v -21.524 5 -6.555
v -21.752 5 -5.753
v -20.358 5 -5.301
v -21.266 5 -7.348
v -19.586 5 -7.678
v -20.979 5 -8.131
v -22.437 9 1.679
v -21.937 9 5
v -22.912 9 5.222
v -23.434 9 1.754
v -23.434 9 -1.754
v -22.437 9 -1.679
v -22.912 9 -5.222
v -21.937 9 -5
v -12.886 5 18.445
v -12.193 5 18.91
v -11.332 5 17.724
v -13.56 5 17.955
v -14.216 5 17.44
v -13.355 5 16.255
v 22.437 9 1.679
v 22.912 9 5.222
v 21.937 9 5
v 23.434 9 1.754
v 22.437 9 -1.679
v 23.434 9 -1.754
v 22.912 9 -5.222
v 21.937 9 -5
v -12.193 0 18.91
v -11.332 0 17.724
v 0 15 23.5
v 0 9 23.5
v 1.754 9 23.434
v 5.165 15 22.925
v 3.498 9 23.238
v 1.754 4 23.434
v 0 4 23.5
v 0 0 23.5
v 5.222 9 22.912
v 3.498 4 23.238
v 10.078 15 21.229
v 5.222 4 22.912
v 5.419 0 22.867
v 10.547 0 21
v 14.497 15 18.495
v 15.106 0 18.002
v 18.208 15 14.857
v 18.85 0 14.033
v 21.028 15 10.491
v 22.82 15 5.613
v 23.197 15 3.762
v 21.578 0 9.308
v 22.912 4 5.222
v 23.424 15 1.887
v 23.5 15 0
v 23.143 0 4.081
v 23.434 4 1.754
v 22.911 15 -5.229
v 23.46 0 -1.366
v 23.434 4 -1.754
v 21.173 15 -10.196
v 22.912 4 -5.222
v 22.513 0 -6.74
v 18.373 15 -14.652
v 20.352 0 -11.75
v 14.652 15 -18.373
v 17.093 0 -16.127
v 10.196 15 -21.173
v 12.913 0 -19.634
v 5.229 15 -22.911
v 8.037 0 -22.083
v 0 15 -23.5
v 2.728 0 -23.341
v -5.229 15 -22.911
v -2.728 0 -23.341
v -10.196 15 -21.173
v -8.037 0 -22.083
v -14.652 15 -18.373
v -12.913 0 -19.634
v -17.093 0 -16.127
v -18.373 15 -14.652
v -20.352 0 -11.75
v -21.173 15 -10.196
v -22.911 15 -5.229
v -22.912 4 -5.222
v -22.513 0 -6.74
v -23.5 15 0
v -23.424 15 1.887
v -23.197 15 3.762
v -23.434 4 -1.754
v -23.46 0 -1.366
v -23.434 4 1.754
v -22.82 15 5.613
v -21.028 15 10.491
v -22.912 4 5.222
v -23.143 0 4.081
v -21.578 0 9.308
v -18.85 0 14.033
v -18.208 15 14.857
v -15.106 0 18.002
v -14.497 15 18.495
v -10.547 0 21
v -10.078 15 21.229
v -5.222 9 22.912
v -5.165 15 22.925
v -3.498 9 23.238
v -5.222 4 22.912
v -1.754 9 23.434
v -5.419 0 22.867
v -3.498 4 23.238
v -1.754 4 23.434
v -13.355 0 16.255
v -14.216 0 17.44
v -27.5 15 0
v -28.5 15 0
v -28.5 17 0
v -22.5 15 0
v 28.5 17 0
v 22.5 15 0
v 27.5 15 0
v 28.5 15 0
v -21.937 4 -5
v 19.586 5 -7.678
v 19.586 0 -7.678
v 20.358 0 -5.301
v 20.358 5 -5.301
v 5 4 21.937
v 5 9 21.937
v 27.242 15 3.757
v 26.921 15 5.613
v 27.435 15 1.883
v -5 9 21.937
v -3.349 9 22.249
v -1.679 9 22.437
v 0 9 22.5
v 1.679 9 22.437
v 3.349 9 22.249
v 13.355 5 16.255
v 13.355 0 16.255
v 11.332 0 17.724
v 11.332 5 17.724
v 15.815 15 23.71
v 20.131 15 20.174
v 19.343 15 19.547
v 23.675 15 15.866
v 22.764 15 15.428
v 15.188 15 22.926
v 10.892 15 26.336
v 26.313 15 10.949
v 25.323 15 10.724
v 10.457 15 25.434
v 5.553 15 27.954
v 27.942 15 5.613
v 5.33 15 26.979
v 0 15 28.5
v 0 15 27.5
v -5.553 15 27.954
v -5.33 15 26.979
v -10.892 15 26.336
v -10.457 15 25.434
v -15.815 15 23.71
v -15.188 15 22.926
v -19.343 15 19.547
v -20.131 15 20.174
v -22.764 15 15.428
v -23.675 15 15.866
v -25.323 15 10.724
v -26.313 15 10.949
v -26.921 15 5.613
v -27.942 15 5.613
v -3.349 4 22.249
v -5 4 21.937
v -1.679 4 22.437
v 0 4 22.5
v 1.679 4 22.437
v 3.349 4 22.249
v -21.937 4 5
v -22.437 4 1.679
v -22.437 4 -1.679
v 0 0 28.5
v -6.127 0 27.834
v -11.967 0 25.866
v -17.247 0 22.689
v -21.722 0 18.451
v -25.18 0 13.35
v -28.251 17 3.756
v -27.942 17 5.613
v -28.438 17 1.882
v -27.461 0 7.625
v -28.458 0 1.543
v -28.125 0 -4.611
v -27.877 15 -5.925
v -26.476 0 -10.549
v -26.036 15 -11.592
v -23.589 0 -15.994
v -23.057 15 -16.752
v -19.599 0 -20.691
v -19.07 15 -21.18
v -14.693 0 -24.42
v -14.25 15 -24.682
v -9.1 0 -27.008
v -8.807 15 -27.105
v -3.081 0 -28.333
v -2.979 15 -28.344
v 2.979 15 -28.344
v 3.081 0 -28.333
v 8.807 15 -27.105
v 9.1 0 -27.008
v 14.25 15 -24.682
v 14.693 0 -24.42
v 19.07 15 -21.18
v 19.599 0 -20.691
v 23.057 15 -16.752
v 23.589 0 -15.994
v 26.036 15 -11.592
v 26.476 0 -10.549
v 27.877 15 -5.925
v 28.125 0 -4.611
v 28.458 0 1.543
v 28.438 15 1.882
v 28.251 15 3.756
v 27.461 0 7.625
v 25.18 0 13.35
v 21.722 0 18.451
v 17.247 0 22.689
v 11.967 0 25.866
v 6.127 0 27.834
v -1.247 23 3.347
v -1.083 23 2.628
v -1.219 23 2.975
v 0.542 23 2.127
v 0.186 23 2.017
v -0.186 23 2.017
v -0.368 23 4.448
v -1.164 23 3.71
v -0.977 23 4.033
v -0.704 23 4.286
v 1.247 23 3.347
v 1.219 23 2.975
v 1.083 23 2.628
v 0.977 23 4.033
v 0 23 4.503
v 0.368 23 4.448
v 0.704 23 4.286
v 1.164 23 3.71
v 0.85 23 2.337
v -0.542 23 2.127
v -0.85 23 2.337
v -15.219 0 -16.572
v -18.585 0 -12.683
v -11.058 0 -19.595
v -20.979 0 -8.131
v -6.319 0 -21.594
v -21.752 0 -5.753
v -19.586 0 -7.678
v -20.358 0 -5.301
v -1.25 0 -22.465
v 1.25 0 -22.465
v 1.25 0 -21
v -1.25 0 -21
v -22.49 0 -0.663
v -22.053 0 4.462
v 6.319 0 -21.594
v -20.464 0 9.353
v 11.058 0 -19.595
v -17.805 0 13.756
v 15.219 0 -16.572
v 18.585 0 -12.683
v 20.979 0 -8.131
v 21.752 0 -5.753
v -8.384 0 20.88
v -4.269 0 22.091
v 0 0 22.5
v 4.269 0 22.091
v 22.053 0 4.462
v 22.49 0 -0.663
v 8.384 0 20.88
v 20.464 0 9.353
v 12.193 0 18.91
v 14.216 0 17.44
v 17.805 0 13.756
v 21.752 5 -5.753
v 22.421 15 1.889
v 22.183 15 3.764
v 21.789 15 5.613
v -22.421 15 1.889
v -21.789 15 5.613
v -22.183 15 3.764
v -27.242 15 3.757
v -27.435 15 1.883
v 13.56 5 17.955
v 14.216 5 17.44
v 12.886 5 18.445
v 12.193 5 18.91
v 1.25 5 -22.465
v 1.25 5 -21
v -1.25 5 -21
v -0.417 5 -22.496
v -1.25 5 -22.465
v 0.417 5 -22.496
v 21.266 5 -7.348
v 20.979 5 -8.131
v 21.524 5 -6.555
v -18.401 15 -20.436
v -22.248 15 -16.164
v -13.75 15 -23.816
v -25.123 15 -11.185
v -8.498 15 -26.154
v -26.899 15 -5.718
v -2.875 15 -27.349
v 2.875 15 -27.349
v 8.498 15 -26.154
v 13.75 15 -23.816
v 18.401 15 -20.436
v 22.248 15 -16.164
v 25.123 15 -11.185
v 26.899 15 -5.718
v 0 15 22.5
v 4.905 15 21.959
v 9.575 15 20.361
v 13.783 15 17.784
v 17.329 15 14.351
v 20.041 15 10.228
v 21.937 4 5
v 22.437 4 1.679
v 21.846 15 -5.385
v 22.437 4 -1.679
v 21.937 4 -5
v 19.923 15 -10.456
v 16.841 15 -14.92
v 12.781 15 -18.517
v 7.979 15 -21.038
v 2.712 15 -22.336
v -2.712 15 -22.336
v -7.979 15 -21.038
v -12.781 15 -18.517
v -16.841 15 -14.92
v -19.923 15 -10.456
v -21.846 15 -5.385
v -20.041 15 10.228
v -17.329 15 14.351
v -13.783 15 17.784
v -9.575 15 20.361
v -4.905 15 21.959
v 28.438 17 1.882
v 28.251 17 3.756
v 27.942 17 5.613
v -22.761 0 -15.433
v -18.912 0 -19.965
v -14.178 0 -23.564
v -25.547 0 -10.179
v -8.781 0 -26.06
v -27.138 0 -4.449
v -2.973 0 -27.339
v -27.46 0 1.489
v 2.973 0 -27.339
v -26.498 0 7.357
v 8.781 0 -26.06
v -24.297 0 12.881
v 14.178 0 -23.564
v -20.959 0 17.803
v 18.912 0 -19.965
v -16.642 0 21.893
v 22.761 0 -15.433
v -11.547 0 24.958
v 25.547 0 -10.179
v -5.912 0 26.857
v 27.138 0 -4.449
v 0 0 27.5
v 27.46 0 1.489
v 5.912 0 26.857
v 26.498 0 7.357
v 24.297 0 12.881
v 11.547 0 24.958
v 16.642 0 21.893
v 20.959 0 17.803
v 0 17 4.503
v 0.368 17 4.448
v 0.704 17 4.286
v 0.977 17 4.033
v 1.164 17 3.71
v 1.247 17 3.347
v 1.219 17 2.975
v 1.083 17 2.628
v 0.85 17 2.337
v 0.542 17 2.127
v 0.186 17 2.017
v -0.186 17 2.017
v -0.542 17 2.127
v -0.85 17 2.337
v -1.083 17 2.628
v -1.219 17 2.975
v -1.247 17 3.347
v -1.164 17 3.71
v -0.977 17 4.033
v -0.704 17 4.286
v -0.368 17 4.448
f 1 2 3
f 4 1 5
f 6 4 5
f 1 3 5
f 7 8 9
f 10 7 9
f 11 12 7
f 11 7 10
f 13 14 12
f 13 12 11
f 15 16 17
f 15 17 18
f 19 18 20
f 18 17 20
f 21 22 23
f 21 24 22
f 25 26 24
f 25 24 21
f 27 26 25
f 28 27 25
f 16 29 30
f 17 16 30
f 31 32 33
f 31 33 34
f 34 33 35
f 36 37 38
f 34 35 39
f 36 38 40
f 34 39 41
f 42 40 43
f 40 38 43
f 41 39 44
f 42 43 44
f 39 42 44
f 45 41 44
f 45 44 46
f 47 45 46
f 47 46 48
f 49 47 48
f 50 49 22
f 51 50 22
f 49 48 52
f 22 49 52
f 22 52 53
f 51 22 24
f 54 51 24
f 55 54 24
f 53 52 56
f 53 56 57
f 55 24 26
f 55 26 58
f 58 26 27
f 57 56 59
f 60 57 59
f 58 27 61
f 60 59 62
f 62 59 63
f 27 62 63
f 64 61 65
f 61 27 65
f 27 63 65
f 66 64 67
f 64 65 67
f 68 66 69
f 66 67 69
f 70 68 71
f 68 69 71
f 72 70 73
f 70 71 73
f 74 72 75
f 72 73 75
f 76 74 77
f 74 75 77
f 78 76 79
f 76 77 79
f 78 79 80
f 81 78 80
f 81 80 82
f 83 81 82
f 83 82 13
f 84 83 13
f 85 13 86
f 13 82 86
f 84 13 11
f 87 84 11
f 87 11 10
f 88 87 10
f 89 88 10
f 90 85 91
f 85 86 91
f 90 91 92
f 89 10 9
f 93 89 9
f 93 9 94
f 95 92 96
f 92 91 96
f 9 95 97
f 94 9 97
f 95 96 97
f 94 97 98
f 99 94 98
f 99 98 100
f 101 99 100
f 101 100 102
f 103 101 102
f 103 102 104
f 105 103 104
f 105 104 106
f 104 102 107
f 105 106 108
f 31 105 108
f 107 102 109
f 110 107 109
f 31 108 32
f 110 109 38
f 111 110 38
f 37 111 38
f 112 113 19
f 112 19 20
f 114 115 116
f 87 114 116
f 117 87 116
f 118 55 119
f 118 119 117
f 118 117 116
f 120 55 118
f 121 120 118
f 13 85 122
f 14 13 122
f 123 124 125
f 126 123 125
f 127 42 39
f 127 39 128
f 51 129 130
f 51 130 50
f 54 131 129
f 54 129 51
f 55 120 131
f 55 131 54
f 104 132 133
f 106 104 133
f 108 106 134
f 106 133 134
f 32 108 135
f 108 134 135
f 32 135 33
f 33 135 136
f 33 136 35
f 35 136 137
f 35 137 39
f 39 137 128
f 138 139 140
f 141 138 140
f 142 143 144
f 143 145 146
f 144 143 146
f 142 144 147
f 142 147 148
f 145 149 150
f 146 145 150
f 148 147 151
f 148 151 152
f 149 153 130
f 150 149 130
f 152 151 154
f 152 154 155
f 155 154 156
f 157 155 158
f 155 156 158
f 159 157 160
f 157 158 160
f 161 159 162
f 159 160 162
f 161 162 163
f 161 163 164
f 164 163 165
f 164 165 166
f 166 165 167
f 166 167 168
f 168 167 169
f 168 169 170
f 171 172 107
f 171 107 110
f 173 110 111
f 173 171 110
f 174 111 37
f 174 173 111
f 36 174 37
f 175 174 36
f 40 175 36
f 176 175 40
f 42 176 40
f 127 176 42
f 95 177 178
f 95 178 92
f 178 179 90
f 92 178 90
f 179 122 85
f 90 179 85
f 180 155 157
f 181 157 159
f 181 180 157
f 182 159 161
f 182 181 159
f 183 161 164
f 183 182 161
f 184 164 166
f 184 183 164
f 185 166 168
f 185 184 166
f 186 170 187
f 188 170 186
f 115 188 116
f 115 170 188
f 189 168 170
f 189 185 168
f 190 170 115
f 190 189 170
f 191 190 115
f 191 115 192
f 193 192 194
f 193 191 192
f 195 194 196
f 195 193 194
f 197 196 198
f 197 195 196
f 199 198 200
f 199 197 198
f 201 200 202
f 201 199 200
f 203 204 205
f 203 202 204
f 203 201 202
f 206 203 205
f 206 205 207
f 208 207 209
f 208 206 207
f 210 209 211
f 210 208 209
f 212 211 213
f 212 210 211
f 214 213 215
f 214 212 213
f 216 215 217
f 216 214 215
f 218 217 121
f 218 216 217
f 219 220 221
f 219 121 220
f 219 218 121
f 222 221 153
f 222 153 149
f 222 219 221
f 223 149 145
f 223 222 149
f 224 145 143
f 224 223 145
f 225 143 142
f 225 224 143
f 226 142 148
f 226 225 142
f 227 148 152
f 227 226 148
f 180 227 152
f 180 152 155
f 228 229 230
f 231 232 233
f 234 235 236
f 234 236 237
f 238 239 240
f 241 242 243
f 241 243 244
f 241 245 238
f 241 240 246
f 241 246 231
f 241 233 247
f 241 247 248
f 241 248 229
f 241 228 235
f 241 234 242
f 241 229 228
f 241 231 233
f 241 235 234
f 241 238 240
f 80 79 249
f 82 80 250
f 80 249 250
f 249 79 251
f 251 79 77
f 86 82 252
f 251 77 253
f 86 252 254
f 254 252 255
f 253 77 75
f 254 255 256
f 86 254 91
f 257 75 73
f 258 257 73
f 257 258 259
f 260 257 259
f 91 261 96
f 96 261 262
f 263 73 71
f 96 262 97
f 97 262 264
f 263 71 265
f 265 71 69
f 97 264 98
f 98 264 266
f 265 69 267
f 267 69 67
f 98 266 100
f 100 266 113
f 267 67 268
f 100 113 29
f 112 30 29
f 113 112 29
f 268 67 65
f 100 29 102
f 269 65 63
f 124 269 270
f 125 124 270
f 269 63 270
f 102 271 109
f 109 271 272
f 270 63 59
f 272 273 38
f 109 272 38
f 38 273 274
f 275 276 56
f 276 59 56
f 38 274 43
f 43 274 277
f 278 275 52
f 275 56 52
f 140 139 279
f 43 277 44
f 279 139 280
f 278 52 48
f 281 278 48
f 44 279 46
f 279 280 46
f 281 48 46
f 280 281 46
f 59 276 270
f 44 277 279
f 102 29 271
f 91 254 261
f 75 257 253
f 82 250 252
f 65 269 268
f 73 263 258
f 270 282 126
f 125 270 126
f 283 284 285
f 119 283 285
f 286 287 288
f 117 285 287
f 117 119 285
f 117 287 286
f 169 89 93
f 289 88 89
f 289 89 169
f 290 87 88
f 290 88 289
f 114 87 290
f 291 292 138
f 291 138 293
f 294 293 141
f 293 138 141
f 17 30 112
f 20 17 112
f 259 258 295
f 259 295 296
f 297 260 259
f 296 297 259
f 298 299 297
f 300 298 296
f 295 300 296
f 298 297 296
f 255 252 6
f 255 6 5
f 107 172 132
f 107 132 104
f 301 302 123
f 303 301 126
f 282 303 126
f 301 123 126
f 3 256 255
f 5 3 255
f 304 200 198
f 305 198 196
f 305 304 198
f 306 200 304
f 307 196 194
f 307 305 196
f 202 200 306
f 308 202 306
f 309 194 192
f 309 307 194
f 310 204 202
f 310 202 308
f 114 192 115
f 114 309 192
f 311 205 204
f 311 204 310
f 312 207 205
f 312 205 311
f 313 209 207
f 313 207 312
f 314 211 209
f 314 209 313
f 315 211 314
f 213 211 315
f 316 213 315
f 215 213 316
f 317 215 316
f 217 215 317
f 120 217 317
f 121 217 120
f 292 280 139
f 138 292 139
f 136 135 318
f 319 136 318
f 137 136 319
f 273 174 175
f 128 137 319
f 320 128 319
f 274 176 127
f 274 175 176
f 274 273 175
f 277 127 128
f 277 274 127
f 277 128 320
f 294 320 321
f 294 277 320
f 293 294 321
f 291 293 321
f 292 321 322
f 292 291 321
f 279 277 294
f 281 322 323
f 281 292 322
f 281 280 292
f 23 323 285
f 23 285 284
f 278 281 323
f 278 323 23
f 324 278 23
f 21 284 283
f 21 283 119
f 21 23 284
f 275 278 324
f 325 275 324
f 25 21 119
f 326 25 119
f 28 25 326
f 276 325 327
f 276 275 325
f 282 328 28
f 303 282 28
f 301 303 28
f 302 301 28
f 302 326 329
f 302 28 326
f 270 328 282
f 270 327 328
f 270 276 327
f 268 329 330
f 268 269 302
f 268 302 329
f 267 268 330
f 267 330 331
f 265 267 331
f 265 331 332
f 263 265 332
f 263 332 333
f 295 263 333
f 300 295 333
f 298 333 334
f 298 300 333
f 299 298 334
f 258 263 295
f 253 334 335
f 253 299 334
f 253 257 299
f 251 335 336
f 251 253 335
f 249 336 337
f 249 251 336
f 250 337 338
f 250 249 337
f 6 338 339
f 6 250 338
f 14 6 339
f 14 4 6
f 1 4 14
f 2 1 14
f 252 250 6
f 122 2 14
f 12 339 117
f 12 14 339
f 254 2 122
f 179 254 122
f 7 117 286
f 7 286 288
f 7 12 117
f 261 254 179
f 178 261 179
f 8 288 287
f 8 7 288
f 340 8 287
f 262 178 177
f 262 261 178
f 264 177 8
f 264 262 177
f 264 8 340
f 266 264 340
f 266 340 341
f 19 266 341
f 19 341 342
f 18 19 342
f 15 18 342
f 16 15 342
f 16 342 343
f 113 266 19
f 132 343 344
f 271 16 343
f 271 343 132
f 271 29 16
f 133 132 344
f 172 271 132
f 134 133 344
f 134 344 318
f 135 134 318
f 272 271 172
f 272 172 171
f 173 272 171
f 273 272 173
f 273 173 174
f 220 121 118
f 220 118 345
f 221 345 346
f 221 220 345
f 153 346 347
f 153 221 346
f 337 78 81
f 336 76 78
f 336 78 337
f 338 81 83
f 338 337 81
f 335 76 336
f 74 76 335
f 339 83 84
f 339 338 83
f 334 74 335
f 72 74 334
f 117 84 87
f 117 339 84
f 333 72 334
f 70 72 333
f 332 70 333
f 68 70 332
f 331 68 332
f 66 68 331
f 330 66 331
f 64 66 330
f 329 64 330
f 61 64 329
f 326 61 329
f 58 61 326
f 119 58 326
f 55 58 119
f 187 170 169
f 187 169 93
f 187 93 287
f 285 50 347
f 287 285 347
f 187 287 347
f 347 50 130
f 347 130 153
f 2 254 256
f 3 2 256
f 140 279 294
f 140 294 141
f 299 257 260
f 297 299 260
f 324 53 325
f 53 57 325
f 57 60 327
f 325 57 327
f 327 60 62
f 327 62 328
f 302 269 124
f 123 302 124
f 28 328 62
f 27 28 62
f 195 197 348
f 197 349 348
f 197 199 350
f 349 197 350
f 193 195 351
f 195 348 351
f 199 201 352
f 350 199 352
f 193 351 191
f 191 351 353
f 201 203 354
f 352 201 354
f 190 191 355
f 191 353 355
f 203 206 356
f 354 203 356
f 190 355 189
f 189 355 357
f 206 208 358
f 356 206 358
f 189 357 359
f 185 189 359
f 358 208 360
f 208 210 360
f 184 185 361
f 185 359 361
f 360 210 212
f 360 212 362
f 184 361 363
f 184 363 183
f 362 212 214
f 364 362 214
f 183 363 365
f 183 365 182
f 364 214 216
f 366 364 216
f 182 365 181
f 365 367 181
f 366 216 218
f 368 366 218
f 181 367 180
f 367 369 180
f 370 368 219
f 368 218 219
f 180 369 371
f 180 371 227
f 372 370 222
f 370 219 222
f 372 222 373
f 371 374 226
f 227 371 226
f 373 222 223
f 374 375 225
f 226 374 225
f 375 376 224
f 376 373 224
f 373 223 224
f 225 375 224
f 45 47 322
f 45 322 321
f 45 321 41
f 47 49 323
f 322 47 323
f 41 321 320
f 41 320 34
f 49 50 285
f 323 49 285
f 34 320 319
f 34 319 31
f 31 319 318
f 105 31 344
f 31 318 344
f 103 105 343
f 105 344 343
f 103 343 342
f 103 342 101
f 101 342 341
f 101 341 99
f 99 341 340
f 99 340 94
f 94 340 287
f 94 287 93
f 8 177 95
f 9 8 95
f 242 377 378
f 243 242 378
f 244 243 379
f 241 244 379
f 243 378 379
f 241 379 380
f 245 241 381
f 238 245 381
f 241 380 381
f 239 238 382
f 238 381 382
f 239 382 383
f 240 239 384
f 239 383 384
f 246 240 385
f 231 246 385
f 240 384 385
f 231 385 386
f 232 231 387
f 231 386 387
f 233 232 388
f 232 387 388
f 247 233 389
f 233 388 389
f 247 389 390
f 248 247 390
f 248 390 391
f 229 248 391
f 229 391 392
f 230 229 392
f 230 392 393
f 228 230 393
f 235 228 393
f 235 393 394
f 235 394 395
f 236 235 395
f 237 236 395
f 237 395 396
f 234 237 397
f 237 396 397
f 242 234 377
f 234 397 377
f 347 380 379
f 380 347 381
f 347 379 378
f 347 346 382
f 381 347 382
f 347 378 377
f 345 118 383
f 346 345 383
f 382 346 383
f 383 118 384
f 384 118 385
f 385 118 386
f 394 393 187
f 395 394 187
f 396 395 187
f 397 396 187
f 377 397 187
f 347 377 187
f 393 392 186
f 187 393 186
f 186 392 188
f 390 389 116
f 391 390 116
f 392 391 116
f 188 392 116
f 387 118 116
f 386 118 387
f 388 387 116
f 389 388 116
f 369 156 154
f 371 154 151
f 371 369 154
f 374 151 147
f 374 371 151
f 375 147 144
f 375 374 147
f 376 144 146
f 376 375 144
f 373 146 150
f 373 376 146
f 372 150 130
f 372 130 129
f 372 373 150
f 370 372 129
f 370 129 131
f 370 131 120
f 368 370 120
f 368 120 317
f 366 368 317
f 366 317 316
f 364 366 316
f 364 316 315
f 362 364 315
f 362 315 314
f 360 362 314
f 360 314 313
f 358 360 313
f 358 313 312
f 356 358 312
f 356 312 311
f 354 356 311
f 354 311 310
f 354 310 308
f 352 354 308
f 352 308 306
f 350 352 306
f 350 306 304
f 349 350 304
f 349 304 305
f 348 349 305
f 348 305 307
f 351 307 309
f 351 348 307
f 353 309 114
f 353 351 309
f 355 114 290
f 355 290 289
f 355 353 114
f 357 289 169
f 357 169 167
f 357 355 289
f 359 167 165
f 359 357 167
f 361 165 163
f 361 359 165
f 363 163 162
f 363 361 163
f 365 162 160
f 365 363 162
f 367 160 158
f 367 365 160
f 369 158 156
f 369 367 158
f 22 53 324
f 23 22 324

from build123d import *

# Parameters (mm, degrees)
SKETCH1_R             = 23.5
SKETCH1_R_2           = 22.5
BOSS_EXTRUDE1_DEPTH   = 15
SKETCH1_R_3           = 28.5
SKETCH1_R_4           = 27.5
BOSS_EXTRUDE1_2_DEPTH = 15
CUT_EXTRUDE2_DEPTH    = 5
BOSS_EXTRUDE3_DEPTH   = 2
SKETCH5_R             = 1.25
BOSS_EXTRUDE4_DEPTH   = 6
CUT_EXTRUDE3_START    = -2
CUT_EXTRUDE3_DEPTH    = 2
SKETCH7_W             = 2.5
SKETCH7_H             = 1.5
BOSS_EXTRUDE5_DEPTH   = 5
CIRPATTERN1_COUNT     = 5


with BuildPart() as part:
    # Sketch1 → Boss-Extrude1 (new body)
    with BuildSketch(Plane(origin=(0, 0, 0), x_dir=(1, 0, 0), z_dir=(0, 1, 0))):
        Circle(SKETCH1_R)
        Circle(SKETCH1_R_2, mode=Mode.SUBTRACT)
    extrude(amount=BOSS_EXTRUDE1_DEPTH)

    # Sketch4 → Cut-Extrude2 (cut)
    with BuildSketch(Plane(origin=(0, 4, 0), x_dir=(-1, 0, 0), z_dir=(0, -1, 0))):
        with BuildLine():
            Line((22.912407012, 5.222222222), (21.937410968, 5))
            ThreePointArc((21.937410968, 5), (22.5, 0), (21.937410968, -5))
            Line((21.937410968, -5), (22.912407012, -5.222222222))
            ThreePointArc((22.912407012, -5.222222222), (23.5, 0), (22.912407012, 5.222222222))
        make_face()
        with BuildLine():
            Line((-22.912407012, -5.222222222), (-21.937410968, -5))
            ThreePointArc((-21.937410968, -5), (-22.5, 0), (-21.937410968, 5))
            Line((-21.937410968, 5), (-22.912407012, 5.222222222))
            ThreePointArc((-22.912407012, 5.222222222), (-23.5, 0), (-22.912407012, -5.222222222))
        make_face()
        with BuildLine():
            Line((-5.222222222, -22.912407012), (-5, -21.937410968))
            ThreePointArc((-5, -21.937410968), (0, -22.5), (5, -21.937410968))
            Line((5, -21.937410968), (5.222222222, -22.912407012))
            ThreePointArc((5.222222222, -22.912407012), (0, -23.5), (-5.222222222, -22.912407012))
        make_face()
    extrude(amount=-CUT_EXTRUDE2_DEPTH, mode=Mode.SUBTRACT)



with BuildPart() as body_2:
    # Sketch1 → Boss-Extrude1 2 (new body)
    with BuildSketch(Plane(origin=(0, 0, 0), x_dir=(1, 0, 0), z_dir=(0, 1, 0))):
        Circle(SKETCH1_R_3)
        Circle(SKETCH1_R_4, mode=Mode.SUBTRACT)
    extrude(amount=BOSS_EXTRUDE1_2_DEPTH)


with BuildPart() as part_1:
    add(part.part)

    add(body_2.part)  # Boss-Extrude3 merges body 2
    # Sketch3 → Boss-Extrude3 (add)
    with BuildSketch(Plane(origin=(0, 15, 0), x_dir=(1, 0, 0), z_dir=(0, 1, 0))):
        with BuildLine():
            Line((-28.5, 0), (28.5, 0))
            ThreePointArc((28.5, 0), (0, -28.5), (-28.5, 0))
        make_face()
    extrude(amount=BOSS_EXTRUDE3_DEPTH)

    # Sketch5 → Boss-Extrude4 (add)
    with BuildSketch(Plane(origin=(0, 17, 0), x_dir=(1, 0, 0), z_dir=(0, 1, 0))):
        with Locations((0, -3.253176926)):
            Circle(SKETCH5_R)
    extrude(amount=BOSS_EXTRUDE4_DEPTH)

    # Sketch6 → Cut-Extrude3 (cut)
    with BuildSketch(Plane(origin=(0, 17, 0), x_dir=(1, 0, 0), z_dir=(0, 1, 0)).offset(CUT_EXTRUDE3_START)):
        with BuildLine():
            Line((-27.941794444, -5.613031555), (27.941794444, -5.613031555))
            ThreePointArc((27.941794444, -5.613031555), (0, -28.5), (-27.941794444, -5.613031555))
        make_face()
    extrude(amount=CUT_EXTRUDE3_DEPTH, mode=Mode.SUBTRACT)

    # Sketch7 → Boss-Extrude5 (add)
    with BuildSketch(Plane.XZ):
        with Locations((0, -21.75)):
            Rectangle(SKETCH7_W, SKETCH7_H)
    boss_extrude5 = extrude(amount=-BOSS_EXTRUDE5_DEPTH)

    # CirPattern1: Boss-Extrude5 ×5 about axis
    cirpattern1_axis = Axis((0, 0, 0), (0, 1, 0))
    for i in range(1, CIRPATTERN1_COUNT):
        add(boss_extrude5.rotate(cirpattern1_axis, i * 360 / CIRPATTERN1_COUNT))


solid = part_1.part
